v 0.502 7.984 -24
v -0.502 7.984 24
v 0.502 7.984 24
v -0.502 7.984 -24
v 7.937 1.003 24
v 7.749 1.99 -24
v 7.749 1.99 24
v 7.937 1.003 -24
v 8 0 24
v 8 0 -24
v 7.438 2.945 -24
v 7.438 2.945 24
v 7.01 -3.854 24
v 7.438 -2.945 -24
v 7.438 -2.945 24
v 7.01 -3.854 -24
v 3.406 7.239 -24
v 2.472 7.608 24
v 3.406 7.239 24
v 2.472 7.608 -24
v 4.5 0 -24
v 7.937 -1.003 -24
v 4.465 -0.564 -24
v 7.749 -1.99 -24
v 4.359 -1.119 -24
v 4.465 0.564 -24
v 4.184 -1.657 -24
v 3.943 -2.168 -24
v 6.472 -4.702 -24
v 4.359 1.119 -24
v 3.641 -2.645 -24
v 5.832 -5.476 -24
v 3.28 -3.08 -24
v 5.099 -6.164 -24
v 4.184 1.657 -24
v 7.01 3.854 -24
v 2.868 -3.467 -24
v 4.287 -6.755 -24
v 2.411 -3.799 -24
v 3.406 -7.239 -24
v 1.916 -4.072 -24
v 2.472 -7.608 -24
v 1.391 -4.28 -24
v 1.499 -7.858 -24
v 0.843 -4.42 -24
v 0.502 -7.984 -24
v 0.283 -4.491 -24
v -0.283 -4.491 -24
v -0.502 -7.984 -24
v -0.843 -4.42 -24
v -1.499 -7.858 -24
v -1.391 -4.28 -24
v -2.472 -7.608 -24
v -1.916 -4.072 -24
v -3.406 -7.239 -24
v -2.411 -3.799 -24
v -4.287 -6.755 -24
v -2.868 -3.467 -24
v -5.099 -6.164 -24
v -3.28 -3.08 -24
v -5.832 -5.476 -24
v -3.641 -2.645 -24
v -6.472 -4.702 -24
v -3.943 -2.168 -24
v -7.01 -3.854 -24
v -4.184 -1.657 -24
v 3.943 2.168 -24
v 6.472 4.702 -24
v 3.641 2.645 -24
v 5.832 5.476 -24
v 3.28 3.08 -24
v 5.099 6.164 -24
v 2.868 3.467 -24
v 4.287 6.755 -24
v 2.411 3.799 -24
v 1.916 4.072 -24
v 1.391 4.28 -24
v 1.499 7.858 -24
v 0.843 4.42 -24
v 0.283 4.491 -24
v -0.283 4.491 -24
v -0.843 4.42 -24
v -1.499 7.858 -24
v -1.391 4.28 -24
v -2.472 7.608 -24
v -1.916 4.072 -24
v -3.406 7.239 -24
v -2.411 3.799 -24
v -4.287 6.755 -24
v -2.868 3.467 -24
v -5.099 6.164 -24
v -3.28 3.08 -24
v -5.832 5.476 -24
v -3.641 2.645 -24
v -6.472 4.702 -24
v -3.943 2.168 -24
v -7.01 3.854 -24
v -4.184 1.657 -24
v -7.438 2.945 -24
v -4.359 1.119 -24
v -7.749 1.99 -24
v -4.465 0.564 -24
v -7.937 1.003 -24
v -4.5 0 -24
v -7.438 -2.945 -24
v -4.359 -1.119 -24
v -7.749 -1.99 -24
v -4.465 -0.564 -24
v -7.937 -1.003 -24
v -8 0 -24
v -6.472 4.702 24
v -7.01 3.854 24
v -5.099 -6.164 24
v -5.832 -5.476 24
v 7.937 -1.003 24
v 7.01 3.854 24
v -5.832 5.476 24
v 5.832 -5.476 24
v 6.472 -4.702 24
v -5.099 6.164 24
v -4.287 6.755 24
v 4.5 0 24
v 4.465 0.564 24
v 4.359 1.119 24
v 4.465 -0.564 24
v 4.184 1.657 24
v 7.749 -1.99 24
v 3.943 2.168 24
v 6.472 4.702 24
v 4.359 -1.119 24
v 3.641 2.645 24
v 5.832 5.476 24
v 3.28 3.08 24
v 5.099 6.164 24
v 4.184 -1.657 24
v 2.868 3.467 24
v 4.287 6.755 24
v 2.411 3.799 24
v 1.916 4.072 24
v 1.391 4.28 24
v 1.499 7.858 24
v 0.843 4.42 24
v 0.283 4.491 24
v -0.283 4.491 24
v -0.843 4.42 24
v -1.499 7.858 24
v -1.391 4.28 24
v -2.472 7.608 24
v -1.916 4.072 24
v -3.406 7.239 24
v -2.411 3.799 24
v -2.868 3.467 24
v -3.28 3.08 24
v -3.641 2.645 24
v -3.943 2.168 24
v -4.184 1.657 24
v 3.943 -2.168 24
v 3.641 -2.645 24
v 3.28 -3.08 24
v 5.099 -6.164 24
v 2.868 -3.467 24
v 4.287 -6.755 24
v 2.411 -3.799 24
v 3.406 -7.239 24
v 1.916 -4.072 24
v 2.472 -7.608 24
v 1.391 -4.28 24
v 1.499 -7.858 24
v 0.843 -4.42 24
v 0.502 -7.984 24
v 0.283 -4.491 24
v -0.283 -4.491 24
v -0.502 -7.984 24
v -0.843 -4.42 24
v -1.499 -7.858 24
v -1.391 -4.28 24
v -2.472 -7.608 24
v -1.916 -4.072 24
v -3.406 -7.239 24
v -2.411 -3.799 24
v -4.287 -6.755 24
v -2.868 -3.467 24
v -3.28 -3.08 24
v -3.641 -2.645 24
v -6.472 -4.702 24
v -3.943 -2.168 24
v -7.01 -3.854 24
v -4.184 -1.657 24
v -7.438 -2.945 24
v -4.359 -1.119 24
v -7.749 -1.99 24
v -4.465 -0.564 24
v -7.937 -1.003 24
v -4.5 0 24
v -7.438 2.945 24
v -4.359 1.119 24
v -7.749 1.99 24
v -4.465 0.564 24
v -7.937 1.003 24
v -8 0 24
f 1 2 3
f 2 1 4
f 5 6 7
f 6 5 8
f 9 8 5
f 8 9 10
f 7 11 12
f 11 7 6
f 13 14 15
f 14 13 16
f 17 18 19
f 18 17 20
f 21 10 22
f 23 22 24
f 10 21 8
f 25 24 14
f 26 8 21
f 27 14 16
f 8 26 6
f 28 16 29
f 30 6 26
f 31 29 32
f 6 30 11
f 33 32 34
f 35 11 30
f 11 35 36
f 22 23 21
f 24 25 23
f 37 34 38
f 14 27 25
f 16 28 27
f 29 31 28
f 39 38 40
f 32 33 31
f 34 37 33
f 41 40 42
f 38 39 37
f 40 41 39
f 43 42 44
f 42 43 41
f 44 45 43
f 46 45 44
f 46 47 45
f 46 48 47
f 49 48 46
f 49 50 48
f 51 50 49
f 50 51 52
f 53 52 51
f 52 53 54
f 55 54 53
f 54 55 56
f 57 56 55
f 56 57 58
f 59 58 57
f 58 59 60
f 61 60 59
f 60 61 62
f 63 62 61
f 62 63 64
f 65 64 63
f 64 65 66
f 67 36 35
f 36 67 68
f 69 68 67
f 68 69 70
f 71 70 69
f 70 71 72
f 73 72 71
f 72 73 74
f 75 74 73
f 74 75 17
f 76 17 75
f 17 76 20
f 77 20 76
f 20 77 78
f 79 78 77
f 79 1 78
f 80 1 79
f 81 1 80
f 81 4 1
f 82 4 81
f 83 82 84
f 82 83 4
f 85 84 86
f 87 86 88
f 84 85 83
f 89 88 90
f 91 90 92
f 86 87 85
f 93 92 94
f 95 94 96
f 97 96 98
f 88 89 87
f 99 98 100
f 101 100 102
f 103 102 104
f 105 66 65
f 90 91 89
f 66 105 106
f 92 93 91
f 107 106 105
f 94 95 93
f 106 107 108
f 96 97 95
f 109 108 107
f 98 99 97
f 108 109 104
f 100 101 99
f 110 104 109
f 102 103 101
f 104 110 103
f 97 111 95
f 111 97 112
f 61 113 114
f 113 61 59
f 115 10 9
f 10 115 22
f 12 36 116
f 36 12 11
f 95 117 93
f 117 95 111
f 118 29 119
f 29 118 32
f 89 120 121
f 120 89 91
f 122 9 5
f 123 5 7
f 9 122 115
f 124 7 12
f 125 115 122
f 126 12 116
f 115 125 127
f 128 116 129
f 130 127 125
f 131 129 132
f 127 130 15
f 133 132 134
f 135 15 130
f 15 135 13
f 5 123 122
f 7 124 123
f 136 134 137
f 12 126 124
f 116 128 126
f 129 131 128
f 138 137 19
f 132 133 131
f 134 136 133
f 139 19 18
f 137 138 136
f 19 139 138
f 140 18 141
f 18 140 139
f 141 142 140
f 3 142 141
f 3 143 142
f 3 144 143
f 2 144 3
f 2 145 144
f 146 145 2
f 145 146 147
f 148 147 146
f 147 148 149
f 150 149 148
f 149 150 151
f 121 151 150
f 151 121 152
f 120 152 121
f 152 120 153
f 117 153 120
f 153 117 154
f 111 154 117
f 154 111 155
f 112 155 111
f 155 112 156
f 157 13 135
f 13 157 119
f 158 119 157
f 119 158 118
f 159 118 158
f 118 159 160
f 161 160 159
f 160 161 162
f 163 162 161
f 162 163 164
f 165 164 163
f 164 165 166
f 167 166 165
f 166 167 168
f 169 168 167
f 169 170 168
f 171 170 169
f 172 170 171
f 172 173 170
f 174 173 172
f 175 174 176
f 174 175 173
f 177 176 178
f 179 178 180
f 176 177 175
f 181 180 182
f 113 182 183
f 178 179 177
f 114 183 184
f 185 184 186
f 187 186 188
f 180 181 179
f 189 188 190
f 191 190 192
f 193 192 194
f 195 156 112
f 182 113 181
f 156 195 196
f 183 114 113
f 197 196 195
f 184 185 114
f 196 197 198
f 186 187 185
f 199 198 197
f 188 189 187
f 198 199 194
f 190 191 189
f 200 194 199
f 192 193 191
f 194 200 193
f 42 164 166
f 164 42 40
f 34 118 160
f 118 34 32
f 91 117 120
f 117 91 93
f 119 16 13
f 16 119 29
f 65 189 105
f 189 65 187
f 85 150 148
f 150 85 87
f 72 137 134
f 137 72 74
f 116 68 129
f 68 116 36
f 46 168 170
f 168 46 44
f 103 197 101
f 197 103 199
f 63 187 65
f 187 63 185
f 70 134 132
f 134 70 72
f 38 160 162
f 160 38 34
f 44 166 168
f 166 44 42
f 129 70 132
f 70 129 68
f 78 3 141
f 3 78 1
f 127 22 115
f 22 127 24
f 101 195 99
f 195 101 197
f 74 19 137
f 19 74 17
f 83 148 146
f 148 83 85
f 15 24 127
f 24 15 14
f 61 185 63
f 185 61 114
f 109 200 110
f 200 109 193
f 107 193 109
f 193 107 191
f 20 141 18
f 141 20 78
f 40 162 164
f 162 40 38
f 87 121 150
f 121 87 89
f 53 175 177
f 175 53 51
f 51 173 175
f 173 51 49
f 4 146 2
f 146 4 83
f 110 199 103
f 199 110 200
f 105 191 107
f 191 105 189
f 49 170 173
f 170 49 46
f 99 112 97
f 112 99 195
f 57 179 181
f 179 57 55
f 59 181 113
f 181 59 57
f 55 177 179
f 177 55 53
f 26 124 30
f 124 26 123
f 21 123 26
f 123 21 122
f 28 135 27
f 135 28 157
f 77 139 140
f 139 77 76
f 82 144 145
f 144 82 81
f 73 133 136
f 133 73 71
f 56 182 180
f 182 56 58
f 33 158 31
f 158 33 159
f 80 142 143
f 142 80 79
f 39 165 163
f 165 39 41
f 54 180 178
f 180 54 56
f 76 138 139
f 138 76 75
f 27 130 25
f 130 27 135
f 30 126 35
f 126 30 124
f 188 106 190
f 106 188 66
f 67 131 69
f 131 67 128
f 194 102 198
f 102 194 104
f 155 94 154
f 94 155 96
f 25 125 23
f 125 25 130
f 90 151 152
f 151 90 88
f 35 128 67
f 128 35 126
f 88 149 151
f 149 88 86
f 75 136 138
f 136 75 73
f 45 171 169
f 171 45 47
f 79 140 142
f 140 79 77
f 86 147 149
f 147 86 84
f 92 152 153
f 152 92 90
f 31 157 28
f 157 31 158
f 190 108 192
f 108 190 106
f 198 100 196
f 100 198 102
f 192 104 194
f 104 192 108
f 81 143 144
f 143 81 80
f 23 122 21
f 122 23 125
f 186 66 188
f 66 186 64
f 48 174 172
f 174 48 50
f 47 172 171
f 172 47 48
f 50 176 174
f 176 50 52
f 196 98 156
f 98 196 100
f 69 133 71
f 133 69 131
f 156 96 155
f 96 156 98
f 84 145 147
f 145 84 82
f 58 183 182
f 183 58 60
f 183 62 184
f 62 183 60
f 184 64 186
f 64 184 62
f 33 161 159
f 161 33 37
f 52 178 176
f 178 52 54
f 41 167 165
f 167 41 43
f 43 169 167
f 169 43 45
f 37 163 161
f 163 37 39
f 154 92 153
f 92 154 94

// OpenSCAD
$fn = 50;


difference() {
	union() {
		translate(v = [0, 0, -24.0000000000]) {
			cylinder(h = 48, r = 8.0000000000);
		}
	}
	union() {
		translate(v = [0, 0, -100.0000000000]) {
			cylinder(h = 200, r = 4.5000000000);
		}
	}
}
